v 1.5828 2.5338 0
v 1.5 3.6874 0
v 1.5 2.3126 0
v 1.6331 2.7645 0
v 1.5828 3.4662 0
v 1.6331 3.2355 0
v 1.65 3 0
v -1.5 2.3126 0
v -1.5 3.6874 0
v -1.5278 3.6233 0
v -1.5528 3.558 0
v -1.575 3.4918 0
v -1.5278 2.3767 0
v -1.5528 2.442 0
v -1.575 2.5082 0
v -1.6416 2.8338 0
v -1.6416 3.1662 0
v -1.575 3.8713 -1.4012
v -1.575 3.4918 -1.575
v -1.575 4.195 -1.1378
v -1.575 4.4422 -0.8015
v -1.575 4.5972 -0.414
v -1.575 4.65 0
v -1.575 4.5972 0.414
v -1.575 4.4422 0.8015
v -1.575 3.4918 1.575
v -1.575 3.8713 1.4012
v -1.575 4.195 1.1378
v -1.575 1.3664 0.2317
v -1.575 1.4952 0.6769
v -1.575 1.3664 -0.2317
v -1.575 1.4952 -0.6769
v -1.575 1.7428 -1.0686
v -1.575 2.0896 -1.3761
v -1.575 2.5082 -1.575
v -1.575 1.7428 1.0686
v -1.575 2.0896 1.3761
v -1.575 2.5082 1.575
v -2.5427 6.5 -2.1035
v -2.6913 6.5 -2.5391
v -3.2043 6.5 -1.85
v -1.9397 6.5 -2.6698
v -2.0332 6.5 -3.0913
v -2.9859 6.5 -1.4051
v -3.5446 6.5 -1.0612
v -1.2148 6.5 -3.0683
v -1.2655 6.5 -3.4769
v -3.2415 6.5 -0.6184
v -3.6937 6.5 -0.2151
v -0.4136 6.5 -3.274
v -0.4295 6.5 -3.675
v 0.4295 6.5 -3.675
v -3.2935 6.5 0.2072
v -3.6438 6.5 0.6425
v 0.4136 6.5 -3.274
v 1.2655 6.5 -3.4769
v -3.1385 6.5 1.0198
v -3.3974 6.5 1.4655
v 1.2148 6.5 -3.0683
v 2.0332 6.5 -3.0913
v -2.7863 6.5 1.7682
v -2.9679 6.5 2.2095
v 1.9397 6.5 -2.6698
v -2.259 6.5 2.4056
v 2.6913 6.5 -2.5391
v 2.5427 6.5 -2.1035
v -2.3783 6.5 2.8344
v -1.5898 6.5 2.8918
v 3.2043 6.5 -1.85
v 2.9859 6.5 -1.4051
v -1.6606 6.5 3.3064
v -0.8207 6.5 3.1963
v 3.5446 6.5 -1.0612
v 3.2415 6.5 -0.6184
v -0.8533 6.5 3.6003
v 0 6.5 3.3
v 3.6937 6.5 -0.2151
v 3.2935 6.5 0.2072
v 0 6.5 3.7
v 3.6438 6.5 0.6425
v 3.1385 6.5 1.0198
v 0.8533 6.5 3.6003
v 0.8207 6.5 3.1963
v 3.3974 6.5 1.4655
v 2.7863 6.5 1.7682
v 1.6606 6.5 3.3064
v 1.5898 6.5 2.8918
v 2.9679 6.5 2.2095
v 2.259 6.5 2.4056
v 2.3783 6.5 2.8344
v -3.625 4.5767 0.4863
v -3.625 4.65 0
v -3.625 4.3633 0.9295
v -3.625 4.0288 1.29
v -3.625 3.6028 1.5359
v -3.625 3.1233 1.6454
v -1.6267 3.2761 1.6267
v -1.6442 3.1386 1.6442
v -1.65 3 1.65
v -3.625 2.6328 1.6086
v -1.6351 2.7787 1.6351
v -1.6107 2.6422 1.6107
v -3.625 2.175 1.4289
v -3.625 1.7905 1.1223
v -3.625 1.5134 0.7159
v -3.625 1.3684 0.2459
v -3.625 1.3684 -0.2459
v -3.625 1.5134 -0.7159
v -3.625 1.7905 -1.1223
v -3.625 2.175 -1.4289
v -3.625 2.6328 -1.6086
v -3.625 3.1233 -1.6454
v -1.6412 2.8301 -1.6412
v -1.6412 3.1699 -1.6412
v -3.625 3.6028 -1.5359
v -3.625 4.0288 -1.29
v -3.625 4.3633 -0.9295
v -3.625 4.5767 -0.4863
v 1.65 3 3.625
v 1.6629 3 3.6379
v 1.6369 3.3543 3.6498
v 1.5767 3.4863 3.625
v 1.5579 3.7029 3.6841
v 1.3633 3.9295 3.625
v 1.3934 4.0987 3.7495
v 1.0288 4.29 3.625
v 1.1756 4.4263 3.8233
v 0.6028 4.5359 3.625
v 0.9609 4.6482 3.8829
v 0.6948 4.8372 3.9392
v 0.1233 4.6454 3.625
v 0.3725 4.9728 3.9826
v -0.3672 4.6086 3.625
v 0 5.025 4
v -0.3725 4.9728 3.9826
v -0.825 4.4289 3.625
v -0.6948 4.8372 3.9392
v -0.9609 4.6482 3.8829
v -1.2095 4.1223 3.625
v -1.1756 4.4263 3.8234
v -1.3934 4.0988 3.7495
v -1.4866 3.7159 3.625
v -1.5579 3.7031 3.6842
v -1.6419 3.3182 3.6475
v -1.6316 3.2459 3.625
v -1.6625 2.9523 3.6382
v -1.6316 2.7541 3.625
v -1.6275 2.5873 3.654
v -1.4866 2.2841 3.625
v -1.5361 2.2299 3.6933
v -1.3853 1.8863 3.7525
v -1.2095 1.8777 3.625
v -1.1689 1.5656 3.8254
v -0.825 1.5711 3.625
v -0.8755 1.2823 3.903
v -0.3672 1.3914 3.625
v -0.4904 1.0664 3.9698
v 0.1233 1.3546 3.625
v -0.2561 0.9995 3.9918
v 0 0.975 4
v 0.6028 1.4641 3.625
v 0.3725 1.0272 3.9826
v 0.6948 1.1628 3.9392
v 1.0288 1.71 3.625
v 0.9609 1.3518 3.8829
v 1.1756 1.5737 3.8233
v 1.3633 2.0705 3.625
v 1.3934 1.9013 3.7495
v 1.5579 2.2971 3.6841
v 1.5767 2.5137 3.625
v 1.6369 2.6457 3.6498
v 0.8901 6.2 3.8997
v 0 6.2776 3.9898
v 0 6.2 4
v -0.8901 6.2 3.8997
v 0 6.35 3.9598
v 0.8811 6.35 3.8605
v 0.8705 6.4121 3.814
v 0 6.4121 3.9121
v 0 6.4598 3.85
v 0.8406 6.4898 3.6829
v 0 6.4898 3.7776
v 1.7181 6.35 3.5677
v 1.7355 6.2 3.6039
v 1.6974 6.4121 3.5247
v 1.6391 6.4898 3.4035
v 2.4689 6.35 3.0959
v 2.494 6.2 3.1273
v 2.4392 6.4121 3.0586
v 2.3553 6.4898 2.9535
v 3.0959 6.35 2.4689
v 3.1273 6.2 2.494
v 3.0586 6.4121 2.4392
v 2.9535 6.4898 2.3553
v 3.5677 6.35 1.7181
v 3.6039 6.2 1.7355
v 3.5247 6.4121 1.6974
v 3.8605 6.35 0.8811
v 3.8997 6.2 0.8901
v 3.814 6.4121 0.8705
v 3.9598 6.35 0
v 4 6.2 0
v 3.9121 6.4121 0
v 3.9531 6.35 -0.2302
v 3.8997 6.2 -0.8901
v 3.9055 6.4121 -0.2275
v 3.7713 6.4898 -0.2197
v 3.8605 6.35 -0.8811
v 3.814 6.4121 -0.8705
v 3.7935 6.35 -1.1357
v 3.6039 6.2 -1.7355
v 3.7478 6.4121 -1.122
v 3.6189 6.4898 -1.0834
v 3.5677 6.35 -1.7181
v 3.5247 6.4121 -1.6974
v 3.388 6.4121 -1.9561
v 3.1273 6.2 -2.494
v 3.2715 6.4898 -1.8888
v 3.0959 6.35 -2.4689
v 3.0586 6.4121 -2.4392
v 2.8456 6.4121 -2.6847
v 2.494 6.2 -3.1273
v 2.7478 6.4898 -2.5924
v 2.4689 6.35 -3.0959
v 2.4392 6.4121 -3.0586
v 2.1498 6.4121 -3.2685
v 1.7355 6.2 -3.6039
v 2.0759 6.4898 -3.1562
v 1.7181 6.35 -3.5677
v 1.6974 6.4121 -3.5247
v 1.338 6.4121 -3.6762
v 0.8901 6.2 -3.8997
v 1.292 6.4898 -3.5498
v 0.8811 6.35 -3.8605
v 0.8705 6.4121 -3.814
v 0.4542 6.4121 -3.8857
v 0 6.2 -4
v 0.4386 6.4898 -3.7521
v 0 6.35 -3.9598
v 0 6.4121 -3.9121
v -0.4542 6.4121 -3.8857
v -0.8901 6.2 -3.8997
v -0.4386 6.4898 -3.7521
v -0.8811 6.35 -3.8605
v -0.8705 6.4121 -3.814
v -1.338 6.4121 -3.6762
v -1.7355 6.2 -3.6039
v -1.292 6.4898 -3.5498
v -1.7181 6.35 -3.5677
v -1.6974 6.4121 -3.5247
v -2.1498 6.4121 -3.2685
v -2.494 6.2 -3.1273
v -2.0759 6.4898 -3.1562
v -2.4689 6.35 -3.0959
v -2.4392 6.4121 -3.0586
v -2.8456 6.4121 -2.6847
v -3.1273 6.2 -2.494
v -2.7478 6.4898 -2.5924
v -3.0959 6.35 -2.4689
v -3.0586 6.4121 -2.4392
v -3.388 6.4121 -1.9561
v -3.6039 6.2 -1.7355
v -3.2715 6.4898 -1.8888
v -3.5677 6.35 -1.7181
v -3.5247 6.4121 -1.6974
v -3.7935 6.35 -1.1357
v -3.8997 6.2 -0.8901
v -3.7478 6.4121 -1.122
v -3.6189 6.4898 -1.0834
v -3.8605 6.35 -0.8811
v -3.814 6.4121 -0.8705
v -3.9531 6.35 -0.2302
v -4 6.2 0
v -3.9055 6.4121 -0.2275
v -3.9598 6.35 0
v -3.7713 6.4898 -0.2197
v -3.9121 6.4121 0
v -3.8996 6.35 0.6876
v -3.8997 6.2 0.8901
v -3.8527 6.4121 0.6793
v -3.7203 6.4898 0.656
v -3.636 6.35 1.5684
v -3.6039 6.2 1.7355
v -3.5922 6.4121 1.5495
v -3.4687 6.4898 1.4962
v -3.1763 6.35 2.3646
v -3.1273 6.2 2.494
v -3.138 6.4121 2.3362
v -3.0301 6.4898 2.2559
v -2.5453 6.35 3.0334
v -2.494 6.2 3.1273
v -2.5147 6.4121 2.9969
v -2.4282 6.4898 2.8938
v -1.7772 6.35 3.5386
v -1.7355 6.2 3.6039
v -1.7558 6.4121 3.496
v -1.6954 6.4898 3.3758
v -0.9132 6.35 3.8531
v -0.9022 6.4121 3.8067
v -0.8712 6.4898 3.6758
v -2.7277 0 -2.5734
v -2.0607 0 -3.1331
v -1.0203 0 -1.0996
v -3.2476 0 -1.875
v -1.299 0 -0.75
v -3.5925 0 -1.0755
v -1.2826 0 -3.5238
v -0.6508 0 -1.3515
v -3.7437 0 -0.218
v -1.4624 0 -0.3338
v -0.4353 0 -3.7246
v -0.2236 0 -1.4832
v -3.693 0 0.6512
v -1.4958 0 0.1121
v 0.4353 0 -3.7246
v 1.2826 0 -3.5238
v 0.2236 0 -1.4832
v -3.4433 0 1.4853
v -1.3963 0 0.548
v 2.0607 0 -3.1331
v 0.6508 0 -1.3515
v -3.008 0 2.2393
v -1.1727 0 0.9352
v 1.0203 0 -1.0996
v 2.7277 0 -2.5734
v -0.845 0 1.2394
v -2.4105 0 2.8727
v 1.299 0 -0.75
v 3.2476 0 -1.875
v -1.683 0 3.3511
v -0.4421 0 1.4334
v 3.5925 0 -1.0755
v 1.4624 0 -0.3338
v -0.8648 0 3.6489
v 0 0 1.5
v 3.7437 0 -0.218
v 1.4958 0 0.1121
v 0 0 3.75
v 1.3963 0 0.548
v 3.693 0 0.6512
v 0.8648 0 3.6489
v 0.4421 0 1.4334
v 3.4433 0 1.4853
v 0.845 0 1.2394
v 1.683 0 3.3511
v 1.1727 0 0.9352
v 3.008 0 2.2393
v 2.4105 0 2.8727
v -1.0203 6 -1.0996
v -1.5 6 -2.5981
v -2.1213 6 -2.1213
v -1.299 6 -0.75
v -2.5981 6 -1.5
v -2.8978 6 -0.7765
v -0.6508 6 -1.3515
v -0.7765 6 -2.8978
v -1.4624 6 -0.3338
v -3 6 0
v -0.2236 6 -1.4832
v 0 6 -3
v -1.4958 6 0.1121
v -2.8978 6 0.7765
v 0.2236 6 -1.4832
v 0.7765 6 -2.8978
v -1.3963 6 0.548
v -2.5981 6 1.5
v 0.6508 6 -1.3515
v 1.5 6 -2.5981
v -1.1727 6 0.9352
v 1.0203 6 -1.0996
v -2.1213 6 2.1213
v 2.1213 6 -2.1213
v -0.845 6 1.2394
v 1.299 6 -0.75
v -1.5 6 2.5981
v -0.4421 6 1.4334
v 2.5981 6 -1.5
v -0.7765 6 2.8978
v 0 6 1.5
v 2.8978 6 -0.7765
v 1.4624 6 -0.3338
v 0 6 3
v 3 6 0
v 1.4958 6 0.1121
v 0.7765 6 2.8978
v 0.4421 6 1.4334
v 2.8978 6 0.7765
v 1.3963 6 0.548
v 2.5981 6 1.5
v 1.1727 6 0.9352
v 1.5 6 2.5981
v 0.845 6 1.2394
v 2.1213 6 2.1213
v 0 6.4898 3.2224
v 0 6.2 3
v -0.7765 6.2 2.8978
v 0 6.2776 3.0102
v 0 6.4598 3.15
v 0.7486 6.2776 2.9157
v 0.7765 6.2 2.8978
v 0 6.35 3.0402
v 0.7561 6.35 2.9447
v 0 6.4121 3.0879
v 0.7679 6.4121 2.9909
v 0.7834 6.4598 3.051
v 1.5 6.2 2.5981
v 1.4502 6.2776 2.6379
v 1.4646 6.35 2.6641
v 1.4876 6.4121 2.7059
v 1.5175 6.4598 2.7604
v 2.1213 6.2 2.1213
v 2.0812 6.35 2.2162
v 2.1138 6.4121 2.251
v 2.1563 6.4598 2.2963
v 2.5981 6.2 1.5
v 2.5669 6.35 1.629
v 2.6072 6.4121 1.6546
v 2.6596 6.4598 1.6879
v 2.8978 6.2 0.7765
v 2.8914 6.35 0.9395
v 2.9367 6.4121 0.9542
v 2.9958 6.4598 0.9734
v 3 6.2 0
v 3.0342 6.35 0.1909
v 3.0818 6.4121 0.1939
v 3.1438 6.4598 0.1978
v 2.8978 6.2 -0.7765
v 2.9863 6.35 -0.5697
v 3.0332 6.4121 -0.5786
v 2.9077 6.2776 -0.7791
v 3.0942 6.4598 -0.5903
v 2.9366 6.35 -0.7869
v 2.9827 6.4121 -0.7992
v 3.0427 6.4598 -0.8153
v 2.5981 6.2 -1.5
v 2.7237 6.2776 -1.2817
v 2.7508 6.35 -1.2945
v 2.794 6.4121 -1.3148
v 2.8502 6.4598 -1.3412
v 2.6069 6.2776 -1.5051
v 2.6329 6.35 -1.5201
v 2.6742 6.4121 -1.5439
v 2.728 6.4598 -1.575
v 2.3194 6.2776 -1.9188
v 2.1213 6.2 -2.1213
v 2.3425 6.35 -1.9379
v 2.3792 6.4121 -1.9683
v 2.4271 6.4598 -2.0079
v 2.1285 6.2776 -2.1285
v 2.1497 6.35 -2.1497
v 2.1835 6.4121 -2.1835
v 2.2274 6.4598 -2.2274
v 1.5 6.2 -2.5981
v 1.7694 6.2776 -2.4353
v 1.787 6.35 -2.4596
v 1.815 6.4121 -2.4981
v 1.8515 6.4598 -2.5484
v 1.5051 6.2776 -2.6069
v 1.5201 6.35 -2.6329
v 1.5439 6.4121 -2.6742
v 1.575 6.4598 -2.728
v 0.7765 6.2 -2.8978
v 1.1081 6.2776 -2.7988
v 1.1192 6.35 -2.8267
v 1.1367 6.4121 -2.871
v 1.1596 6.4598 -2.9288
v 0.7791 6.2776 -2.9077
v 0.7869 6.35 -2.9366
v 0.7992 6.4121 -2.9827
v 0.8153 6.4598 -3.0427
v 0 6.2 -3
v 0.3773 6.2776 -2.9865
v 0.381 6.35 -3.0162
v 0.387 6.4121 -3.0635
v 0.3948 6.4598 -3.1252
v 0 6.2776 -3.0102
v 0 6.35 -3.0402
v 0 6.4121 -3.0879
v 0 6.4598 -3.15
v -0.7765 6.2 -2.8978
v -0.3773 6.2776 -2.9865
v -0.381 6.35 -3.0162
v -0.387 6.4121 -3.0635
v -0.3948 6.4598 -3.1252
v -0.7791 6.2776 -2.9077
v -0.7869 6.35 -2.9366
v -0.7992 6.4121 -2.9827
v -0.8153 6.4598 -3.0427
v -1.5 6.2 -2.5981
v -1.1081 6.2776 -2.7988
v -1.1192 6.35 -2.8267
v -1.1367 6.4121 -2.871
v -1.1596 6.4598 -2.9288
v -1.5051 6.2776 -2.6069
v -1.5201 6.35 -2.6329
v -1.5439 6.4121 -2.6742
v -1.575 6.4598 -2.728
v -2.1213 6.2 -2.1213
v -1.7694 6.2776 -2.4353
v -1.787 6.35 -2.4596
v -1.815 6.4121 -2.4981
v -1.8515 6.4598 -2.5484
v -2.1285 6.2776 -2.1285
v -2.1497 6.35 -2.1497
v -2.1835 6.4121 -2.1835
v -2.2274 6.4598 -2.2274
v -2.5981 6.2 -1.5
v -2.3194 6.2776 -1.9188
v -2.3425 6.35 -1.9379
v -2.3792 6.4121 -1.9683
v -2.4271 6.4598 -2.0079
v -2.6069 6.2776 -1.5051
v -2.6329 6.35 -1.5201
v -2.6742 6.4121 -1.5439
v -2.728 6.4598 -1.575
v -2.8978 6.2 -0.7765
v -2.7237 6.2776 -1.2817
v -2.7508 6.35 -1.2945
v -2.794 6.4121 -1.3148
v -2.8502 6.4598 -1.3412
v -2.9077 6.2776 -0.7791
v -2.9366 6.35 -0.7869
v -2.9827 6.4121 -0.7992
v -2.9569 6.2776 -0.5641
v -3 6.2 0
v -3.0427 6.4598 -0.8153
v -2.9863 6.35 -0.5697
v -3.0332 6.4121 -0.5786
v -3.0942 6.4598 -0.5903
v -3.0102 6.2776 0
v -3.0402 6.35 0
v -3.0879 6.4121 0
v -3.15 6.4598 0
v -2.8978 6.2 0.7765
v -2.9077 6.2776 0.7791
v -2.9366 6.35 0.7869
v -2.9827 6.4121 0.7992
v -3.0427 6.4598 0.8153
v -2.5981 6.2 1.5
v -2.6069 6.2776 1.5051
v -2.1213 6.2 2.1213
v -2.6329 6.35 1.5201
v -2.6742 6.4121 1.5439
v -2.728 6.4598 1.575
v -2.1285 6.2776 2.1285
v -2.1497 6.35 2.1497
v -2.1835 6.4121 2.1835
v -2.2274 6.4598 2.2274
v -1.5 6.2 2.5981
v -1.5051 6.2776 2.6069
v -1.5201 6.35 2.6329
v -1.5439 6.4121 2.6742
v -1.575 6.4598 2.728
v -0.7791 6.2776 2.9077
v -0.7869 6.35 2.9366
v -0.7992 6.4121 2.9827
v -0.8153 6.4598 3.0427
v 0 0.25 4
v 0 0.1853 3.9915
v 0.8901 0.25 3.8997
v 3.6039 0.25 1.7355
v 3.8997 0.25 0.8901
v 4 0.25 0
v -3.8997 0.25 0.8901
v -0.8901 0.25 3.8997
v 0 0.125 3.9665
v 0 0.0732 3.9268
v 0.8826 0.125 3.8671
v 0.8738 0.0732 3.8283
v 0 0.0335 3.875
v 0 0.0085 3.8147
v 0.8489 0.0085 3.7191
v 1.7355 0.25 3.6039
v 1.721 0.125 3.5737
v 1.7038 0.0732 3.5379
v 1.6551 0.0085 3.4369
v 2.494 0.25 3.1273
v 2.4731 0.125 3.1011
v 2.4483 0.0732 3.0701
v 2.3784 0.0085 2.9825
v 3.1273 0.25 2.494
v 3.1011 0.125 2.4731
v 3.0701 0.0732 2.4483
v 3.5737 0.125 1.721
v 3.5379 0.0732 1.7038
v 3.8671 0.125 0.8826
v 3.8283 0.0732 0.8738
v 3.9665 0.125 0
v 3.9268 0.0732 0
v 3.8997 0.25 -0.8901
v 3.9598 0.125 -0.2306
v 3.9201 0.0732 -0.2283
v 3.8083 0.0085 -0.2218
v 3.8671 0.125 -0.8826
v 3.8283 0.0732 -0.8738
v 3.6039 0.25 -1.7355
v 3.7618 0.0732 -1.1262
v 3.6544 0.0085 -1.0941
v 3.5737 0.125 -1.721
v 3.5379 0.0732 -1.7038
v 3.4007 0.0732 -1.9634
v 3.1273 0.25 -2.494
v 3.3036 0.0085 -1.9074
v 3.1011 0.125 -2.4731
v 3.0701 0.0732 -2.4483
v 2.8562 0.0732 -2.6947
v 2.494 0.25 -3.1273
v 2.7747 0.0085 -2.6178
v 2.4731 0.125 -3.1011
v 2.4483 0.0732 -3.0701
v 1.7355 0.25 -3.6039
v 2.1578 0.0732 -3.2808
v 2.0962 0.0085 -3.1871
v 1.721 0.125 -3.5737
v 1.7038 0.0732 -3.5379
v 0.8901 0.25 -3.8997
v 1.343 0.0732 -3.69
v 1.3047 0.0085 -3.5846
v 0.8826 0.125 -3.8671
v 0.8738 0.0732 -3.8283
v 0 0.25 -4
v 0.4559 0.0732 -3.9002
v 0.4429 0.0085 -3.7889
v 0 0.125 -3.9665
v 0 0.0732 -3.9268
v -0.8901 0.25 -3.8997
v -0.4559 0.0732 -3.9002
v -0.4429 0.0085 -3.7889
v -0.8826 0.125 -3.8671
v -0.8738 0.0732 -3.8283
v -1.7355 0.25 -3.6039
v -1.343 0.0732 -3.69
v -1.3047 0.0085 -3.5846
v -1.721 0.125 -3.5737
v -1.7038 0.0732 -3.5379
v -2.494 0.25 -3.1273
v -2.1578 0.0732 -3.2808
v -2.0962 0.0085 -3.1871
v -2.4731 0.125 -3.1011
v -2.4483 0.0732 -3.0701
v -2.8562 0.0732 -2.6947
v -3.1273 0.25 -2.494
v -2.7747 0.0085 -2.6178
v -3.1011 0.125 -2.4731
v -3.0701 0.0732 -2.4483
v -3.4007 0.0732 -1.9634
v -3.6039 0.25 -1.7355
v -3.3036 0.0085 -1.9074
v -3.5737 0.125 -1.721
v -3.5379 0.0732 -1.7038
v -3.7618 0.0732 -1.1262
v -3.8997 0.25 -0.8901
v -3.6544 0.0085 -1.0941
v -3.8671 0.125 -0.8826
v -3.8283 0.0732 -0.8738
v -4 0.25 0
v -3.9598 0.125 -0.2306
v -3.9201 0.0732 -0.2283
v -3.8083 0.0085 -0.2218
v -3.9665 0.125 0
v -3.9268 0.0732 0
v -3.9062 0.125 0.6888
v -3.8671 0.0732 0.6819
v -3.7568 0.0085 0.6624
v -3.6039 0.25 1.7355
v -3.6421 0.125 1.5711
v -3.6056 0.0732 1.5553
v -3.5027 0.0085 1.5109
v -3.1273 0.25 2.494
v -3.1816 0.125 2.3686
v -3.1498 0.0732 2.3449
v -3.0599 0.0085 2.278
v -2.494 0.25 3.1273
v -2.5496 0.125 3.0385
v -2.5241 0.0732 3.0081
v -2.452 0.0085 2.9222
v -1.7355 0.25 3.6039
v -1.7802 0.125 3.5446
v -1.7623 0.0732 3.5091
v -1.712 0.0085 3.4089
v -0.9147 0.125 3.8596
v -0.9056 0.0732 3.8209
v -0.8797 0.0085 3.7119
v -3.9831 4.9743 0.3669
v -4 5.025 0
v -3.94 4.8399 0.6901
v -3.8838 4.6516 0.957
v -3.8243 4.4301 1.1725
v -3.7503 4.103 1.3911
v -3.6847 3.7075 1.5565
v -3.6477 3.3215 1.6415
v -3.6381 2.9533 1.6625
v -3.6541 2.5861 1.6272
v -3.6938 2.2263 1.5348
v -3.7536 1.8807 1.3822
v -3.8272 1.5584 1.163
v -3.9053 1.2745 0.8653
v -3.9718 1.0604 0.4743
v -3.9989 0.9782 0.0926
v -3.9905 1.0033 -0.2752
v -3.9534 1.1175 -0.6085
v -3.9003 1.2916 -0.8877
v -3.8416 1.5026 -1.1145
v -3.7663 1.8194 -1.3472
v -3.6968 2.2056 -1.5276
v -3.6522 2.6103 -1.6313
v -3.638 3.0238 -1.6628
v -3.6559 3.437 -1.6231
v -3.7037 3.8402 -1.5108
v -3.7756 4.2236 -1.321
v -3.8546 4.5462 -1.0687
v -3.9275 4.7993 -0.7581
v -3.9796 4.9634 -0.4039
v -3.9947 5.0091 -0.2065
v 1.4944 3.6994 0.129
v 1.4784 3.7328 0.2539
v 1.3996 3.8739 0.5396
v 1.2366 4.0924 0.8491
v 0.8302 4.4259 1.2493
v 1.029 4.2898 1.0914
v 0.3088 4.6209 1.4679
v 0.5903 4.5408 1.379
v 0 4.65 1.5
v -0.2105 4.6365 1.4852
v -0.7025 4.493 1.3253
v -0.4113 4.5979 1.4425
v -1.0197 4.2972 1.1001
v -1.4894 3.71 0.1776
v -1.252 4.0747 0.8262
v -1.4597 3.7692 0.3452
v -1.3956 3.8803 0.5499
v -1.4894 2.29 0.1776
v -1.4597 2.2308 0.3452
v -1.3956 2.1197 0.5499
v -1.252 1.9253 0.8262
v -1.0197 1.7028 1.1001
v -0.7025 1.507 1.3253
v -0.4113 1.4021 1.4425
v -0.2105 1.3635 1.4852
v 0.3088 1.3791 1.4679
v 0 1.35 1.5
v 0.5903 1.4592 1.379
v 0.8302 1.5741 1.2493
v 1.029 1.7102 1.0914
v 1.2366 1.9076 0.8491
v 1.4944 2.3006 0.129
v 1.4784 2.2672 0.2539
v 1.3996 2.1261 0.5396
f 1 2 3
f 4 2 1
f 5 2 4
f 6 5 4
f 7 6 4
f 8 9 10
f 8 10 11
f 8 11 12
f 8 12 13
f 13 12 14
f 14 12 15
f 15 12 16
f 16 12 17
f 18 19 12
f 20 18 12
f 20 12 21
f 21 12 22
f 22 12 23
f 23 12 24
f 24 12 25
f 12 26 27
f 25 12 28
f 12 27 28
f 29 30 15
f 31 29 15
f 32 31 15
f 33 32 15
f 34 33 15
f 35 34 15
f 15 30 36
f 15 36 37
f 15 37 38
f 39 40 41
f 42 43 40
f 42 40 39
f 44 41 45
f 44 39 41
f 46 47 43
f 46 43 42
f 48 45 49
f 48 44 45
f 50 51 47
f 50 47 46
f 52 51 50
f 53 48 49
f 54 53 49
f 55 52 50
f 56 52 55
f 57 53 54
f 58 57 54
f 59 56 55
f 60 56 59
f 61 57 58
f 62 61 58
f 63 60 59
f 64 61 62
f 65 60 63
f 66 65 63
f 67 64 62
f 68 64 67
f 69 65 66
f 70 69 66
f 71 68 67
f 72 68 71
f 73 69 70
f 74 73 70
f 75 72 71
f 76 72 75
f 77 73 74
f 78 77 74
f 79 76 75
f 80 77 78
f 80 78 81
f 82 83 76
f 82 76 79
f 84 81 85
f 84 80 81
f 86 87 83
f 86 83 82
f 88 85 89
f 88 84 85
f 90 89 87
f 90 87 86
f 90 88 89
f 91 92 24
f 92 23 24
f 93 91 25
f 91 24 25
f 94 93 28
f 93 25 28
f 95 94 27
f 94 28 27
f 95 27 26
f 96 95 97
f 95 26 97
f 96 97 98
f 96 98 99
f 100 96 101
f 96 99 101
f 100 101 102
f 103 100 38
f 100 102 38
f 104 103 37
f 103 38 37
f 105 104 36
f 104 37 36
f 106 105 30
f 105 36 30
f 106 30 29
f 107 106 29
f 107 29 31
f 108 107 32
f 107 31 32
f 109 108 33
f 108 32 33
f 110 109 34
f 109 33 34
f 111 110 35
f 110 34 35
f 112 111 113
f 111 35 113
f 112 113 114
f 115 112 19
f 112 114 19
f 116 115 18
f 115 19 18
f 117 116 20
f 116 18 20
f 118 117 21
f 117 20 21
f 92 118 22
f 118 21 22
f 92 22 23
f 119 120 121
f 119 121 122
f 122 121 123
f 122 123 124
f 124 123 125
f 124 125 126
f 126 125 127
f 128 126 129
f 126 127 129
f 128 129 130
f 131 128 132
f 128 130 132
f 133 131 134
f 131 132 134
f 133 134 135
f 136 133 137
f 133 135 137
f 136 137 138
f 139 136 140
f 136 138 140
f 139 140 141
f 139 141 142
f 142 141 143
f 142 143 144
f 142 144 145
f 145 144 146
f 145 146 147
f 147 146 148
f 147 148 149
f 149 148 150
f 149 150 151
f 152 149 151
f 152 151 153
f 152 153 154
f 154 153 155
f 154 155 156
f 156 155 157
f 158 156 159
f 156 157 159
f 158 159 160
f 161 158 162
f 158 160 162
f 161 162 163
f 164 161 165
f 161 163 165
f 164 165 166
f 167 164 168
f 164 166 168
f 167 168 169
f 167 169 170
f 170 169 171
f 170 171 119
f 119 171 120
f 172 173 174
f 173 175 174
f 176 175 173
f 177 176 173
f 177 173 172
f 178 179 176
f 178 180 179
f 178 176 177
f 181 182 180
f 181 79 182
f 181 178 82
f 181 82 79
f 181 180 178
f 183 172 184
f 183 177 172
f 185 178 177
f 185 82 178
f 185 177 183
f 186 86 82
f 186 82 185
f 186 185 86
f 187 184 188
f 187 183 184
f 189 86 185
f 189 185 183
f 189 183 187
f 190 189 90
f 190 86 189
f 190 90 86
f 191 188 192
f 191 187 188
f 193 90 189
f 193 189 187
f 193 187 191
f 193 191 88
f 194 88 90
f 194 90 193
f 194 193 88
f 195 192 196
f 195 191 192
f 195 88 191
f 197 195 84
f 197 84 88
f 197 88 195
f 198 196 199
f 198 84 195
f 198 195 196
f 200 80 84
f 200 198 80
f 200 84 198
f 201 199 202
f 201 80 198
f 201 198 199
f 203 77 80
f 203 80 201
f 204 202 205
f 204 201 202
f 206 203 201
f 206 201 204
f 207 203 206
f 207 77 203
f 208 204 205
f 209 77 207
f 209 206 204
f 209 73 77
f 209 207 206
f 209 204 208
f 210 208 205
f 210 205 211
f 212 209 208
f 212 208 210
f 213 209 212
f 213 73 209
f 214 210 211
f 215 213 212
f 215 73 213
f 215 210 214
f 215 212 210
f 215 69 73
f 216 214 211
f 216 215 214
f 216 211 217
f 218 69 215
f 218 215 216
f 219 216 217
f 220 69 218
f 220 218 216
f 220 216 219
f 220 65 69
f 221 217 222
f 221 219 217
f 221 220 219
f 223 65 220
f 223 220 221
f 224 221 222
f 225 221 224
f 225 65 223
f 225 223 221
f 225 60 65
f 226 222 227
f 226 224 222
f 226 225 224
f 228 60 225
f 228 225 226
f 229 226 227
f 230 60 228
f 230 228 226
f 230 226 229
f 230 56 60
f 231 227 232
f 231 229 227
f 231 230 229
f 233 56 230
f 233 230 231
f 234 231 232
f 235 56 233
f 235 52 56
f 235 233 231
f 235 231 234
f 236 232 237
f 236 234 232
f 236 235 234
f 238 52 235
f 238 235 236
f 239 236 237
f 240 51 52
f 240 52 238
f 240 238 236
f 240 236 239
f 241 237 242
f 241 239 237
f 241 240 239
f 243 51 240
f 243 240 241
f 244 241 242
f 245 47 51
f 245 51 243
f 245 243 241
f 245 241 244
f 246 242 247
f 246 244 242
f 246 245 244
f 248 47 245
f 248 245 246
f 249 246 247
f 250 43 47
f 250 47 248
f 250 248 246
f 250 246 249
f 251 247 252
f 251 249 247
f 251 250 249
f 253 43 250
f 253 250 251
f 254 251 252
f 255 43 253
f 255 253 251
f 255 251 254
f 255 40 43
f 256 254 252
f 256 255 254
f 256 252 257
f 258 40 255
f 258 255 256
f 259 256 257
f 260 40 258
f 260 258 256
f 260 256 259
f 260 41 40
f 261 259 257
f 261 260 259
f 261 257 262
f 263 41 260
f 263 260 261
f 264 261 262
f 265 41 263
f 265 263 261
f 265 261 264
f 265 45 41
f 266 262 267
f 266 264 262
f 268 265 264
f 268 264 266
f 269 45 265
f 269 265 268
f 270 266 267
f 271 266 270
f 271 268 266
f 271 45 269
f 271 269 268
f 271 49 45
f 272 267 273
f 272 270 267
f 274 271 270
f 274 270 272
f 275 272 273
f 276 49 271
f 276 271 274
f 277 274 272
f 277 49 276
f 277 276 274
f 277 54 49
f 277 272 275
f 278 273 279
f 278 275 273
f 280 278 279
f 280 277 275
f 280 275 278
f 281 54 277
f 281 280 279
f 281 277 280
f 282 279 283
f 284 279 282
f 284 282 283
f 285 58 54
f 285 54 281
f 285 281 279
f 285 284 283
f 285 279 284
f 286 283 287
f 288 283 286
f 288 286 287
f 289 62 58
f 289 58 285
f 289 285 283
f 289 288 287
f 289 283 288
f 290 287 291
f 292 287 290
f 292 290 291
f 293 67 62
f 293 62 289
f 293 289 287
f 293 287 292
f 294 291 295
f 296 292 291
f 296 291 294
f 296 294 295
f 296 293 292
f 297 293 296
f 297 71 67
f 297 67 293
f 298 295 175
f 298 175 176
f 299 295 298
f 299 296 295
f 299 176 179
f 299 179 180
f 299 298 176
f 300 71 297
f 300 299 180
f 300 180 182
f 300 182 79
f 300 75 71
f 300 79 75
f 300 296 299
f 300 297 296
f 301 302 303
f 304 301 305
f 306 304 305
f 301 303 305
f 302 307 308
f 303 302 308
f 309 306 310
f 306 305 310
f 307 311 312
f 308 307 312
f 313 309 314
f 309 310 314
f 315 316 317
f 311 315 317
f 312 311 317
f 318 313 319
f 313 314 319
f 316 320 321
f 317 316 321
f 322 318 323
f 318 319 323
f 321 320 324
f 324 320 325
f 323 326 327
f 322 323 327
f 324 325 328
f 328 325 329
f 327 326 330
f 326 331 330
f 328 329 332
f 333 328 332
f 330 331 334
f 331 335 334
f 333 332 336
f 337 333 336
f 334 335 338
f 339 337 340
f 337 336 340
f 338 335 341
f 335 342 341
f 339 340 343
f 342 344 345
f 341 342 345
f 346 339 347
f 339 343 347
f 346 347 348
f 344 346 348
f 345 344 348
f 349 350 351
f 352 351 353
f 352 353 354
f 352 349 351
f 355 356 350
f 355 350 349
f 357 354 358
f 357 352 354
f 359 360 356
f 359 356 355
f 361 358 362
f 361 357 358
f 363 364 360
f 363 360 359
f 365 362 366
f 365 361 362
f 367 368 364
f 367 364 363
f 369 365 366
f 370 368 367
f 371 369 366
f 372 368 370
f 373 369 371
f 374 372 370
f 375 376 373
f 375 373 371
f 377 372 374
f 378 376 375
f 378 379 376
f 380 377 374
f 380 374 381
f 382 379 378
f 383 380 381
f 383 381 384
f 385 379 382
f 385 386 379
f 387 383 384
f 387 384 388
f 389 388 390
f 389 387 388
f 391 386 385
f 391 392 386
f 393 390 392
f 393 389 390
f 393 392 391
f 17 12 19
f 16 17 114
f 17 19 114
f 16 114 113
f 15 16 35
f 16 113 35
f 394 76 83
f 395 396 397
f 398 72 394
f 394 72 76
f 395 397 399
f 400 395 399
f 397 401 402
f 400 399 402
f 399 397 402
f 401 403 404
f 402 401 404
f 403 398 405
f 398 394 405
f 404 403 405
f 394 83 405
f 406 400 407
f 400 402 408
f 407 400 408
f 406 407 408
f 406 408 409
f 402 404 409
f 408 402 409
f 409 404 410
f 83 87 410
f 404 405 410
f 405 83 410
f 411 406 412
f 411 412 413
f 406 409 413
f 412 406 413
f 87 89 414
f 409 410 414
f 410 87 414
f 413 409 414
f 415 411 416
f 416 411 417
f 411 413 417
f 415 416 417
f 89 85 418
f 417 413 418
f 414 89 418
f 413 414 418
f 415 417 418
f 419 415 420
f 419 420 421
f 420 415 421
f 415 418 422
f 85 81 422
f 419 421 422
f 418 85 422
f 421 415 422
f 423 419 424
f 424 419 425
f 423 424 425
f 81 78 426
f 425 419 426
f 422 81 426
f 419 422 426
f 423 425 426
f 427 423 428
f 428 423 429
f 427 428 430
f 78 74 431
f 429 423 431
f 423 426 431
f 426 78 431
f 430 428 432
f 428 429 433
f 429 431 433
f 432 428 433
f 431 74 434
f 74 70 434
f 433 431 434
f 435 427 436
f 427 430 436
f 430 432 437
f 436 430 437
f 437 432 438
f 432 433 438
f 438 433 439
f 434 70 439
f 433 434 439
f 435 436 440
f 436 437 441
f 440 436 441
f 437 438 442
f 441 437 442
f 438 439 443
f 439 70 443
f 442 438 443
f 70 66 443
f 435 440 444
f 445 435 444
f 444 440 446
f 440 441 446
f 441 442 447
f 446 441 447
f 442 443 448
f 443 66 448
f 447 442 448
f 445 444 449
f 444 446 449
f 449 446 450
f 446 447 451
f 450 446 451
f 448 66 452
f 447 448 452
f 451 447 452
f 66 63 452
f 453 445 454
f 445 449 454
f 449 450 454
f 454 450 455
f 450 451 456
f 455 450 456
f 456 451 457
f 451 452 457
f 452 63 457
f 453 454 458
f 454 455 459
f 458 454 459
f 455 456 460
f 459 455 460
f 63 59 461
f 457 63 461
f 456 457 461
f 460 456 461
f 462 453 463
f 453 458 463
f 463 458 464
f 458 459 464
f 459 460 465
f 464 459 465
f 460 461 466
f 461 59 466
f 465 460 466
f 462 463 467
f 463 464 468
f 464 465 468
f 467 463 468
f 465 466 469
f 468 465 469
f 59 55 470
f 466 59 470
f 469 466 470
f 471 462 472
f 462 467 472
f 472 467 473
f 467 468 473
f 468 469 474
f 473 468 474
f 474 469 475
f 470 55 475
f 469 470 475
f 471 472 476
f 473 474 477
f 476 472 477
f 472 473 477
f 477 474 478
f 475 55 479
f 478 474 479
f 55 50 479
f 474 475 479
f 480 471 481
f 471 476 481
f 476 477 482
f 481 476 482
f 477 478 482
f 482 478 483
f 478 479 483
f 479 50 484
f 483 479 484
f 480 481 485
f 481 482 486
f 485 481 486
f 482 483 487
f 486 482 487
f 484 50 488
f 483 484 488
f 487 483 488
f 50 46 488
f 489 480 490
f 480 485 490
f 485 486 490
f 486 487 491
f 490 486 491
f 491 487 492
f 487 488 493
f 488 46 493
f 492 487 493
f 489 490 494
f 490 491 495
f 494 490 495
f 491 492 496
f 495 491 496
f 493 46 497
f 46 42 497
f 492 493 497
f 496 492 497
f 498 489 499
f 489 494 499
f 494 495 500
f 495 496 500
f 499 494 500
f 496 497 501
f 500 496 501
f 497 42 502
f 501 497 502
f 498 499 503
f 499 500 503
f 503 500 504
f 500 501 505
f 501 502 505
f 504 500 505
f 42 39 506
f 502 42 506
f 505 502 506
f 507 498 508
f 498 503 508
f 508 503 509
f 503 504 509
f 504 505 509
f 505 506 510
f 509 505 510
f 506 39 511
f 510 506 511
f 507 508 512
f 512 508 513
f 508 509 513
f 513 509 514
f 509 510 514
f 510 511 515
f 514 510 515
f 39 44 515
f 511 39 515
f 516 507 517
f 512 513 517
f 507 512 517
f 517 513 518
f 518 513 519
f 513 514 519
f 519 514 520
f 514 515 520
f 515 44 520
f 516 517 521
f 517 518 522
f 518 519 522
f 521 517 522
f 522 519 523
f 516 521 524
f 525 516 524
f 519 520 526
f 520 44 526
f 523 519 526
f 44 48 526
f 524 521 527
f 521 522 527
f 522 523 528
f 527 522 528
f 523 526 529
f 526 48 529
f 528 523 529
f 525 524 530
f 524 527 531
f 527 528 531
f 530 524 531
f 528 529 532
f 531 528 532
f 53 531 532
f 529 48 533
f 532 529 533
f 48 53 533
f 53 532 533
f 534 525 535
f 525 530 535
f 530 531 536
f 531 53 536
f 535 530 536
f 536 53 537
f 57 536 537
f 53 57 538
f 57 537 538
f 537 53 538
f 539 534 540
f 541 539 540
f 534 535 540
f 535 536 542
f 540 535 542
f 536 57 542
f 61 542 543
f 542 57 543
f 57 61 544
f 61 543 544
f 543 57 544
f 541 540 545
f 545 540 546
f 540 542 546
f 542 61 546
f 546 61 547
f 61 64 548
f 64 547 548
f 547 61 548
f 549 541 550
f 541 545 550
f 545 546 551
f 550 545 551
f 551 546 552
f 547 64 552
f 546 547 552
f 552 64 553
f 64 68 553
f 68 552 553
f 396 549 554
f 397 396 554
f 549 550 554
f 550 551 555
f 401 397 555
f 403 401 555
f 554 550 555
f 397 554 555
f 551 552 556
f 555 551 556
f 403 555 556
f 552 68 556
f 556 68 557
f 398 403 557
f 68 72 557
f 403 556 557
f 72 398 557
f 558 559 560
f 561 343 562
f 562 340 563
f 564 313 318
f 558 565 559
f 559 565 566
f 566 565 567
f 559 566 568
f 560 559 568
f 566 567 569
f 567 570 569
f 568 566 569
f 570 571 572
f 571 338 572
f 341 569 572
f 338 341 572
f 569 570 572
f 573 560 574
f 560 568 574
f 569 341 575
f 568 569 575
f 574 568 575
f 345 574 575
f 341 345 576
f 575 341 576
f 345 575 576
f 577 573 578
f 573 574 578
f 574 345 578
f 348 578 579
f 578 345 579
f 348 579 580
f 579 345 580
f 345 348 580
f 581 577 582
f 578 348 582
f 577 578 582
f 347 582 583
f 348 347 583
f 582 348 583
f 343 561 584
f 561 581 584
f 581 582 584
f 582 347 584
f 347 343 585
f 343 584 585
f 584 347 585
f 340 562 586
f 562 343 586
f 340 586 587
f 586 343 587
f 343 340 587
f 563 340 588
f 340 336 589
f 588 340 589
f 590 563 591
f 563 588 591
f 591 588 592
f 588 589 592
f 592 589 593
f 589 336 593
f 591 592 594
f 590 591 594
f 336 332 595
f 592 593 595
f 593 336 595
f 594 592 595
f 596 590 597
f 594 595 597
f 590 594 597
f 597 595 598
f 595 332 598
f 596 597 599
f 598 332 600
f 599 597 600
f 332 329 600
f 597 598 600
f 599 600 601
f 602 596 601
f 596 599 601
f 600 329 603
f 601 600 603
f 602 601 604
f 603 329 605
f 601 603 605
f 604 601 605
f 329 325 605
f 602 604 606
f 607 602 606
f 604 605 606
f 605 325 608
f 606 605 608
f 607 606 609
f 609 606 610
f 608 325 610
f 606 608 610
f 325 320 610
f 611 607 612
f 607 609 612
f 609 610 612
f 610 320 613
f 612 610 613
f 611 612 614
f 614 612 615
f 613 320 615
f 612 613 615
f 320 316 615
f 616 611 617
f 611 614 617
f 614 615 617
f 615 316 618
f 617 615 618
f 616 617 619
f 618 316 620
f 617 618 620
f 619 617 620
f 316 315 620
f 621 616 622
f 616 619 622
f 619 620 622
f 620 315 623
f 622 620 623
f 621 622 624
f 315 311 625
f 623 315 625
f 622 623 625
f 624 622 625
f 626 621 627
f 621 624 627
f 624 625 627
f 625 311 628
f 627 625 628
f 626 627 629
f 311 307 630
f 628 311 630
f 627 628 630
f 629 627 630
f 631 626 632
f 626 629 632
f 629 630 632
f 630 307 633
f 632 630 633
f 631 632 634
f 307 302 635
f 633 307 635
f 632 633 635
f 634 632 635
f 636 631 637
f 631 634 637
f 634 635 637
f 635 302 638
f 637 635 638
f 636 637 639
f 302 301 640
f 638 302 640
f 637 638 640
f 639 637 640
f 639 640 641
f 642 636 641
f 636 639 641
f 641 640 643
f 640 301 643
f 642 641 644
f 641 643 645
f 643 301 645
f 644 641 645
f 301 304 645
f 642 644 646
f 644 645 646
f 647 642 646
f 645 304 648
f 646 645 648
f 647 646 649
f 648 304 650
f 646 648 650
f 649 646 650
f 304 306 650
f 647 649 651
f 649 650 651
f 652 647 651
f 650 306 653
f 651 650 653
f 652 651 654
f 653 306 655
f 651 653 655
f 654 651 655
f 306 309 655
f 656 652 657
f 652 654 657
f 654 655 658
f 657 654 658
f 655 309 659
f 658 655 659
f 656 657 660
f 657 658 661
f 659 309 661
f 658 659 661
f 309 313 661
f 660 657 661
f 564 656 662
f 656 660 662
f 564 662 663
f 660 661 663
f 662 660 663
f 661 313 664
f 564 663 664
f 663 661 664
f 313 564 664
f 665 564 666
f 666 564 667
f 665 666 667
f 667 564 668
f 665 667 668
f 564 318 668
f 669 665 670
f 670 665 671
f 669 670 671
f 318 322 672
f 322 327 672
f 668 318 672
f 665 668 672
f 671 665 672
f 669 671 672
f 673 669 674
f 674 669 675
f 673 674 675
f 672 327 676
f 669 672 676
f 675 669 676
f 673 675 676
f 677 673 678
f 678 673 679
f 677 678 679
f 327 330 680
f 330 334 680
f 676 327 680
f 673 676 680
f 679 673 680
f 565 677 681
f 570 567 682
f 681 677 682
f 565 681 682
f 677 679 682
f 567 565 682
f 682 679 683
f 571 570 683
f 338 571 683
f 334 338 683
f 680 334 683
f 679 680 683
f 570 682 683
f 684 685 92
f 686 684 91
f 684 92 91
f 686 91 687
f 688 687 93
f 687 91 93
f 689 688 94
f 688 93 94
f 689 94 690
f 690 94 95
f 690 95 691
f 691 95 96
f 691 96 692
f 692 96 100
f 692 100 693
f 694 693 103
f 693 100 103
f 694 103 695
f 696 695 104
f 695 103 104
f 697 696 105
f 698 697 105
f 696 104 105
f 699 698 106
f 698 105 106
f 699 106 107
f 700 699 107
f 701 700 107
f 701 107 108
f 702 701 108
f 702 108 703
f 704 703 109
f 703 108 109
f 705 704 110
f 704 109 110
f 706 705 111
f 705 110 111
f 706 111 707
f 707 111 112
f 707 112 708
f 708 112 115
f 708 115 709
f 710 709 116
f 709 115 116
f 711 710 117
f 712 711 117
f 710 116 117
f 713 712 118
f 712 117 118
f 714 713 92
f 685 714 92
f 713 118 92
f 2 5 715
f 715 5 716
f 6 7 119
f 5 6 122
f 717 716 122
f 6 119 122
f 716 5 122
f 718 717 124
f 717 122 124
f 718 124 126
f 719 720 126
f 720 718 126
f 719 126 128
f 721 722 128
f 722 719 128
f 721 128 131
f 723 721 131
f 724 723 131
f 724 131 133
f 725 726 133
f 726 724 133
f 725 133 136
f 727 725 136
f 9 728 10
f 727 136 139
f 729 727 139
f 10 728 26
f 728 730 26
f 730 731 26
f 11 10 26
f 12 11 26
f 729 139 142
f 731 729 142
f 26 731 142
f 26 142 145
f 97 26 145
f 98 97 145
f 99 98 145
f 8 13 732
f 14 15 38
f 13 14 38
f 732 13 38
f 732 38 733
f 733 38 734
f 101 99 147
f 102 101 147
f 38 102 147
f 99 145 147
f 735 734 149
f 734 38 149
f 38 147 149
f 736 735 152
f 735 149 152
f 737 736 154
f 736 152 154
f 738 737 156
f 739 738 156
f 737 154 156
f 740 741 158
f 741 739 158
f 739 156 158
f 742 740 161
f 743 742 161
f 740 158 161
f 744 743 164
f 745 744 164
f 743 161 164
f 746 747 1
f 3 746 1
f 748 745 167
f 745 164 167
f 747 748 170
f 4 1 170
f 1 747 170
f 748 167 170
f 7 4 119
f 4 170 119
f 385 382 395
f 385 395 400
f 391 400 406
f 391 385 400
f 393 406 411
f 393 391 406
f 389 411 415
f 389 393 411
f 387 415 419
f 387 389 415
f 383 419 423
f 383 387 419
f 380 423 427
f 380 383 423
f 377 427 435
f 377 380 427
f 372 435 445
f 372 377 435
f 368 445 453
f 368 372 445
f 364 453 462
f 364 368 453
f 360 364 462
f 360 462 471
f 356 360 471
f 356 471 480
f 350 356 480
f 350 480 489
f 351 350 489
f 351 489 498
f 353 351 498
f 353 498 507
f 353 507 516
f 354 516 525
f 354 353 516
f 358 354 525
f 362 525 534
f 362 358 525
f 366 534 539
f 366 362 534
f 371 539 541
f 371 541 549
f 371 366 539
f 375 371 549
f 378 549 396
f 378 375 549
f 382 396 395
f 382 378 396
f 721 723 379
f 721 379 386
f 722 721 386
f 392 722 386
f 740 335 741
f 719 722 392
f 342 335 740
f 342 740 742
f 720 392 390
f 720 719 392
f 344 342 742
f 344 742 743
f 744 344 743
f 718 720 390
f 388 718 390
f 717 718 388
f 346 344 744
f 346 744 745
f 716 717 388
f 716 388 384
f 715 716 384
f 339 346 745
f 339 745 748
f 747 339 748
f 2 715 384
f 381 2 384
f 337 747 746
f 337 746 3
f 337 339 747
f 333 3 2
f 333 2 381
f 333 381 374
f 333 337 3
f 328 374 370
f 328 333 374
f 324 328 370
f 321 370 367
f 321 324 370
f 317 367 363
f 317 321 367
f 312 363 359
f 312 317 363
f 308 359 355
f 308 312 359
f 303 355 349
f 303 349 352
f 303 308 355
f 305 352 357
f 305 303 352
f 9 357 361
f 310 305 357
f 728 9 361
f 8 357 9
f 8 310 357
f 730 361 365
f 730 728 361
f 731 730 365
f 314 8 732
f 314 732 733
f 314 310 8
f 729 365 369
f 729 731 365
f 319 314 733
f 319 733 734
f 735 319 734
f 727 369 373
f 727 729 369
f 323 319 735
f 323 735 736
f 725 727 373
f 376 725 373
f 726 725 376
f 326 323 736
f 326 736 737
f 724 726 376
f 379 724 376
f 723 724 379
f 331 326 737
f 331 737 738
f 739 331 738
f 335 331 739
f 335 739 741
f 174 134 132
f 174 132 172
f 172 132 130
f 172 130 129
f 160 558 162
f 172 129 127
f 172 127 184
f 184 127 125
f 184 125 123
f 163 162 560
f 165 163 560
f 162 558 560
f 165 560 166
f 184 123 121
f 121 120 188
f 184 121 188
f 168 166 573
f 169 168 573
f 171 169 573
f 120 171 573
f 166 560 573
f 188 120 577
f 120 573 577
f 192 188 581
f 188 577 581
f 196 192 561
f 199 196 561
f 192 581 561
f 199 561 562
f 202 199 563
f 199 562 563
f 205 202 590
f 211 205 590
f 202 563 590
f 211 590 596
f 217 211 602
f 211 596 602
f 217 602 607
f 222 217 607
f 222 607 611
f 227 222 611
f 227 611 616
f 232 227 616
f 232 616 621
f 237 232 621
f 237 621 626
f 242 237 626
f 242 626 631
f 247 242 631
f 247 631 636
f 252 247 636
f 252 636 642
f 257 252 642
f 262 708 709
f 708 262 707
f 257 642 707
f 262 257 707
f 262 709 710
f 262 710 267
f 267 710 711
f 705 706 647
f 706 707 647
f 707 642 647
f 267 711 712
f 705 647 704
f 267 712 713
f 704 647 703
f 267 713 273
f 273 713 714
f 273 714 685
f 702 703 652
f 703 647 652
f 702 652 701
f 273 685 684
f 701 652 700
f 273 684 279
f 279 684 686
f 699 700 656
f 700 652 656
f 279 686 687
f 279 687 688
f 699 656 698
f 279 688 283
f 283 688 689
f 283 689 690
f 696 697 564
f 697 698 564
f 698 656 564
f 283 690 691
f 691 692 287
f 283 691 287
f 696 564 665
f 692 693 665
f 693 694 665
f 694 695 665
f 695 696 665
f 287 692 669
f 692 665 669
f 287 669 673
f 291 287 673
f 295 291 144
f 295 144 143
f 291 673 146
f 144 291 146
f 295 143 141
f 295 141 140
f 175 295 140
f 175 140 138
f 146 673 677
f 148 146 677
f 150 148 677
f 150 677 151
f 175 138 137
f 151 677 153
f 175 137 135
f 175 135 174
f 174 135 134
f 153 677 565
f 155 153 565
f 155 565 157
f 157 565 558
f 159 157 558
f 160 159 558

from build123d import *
from OCP.BRepAlgoAPI import BRepAlgoAPI_Cut
from OCP.TopTools import TopTools_ListOfShape

# Parameters (mm, degrees)
SKETCH1_R           = 4
SKETCH1_R_2         = 1.5
BOSS_EXTRUDE1_DEPTH = 6
SKETCH2_R           = 4
SKETCH2_R_2         = 3
BOSS_EXTRUDE2_DEPTH = 0.5
FILLET1_R           = 0.3
FILLET2_R           = 0.25
CIRPATTERN1_START   = -3
CIRPATTERN1_2_DEPTH = 3


with BuildPart() as part:
    # Sketch1 → Boss-Extrude1 (new body)
    with BuildSketch(Plane(origin=(0, 0, 0), x_dir=(1, 0, 0), z_dir=(0, 1, 0))):
        with Locations(Location((0, 0, 0), (0, 0, 270))):
            Circle(SKETCH1_R)
        with Locations(Location((0, 0, 0), (0, 0, 270))):
            Circle(SKETCH1_R_2, mode=Mode.SUBTRACT)
    extrude(amount=BOSS_EXTRUDE1_DEPTH)

    # Sketch2 → Boss-Extrude2 (add)
    with BuildSketch(Plane(origin=(0, 6, 0), x_dir=(1, 0, 0), z_dir=(0, 1, 0))):
        with Locations(Location((0, 0, 0), (0, 0, 270))):
            Circle(SKETCH2_R)
        with Locations(Location((0, 0, 0), (0, 0, 270))):
            Circle(SKETCH2_R_2, mode=Mode.SUBTRACT)
    extrude(amount=BOSS_EXTRUDE2_DEPTH)

    # Fillet1
    fillet1_edges = [part.edges().sort_by_distance(p)[0] for p in [
        (0, 6.5, -4),
        (0, 6.5, -3),
    ]]
    fillet(fillet1_edges, radius=FILLET1_R)

    # Fillet2
    fillet2_edges = [part.edges().sort_by_distance(p)[0] for p in [
        (0, 0, -4),
    ]]
    fillet(fillet2_edges, radius=FILLET2_R)


with BuildPart() as m4_tapped_hole1_tool:
    # M4 Tapped Hole1: read off the stored shape, not the designer's step
    # M4 Tapped Hole1 outline → M4 Tapped Hole1 (revolve)
    with BuildSketch(Plane.XZ.offset(-3)):
        Polygon((2.024995394, 3.999995394), (0, 3.999995394), (0, 0), (1.65, 0), (1.65, 3.625), align=None)
    revolve(axis=Axis((0, 3, 0), (0, 0, 1)))


with BuildPart() as part_1:
    add(part.part)

    # M4 Tapped Hole1: cut by m4_tapped_hole1_tool, with a tolerance
    m4_tapped_hole1_stock = TopTools_ListOfShape()
    m4_tapped_hole1_stock.Append(part_1.part.wrapped)
    m4_tapped_hole1_tools = TopTools_ListOfShape()
    m4_tapped_hole1_tools.Append(m4_tapped_hole1_tool.part.wrapped)
    m4_tapped_hole1_cut = BRepAlgoAPI_Cut()
    m4_tapped_hole1_cut.SetArguments(m4_tapped_hole1_stock)
    m4_tapped_hole1_cut.SetTools(m4_tapped_hole1_tools)
    m4_tapped_hole1_cut.SetFuzzyValue(0.00001)
    m4_tapped_hole1_cut.Build()
    add(Compound.cast(m4_tapped_hole1_cut.Shape()).solids(), mode=Mode.REPLACE)

    # CirPattern1: read off the stored shape, not the designer's step
    # CirPattern1 outline → CirPattern1 (revolve, cut)
    with BuildSketch(Plane(origin=(0, 3, 0), x_dir=(0, 1, 0), z_dir=(0, 0, -1))):
        Polygon((0, -4.000116403), (2.025116403, -4.000116403), (1.65, -3.625), (1.65, -1.575), (0, -1.575), align=None)
    revolve(axis=Axis((0, 3, 0), (1, 0, 0)), mode=Mode.SUBTRACT)

    # CirPattern1 2 outline → CirPattern1 2 (add)
    with BuildSketch(Plane.XY.offset(CIRPATTERN1_START)):
        with BuildLine():
            Line((-1.575, 2.508192111), (-1.575, 3.491807889))
            ThreePointArc((-1.575, 3.491807889), (-1.65, 3), (-1.575, 2.508192111))
        make_face()
    extrude(amount=CIRPATTERN1_2_DEPTH)


solid = part_1.part
